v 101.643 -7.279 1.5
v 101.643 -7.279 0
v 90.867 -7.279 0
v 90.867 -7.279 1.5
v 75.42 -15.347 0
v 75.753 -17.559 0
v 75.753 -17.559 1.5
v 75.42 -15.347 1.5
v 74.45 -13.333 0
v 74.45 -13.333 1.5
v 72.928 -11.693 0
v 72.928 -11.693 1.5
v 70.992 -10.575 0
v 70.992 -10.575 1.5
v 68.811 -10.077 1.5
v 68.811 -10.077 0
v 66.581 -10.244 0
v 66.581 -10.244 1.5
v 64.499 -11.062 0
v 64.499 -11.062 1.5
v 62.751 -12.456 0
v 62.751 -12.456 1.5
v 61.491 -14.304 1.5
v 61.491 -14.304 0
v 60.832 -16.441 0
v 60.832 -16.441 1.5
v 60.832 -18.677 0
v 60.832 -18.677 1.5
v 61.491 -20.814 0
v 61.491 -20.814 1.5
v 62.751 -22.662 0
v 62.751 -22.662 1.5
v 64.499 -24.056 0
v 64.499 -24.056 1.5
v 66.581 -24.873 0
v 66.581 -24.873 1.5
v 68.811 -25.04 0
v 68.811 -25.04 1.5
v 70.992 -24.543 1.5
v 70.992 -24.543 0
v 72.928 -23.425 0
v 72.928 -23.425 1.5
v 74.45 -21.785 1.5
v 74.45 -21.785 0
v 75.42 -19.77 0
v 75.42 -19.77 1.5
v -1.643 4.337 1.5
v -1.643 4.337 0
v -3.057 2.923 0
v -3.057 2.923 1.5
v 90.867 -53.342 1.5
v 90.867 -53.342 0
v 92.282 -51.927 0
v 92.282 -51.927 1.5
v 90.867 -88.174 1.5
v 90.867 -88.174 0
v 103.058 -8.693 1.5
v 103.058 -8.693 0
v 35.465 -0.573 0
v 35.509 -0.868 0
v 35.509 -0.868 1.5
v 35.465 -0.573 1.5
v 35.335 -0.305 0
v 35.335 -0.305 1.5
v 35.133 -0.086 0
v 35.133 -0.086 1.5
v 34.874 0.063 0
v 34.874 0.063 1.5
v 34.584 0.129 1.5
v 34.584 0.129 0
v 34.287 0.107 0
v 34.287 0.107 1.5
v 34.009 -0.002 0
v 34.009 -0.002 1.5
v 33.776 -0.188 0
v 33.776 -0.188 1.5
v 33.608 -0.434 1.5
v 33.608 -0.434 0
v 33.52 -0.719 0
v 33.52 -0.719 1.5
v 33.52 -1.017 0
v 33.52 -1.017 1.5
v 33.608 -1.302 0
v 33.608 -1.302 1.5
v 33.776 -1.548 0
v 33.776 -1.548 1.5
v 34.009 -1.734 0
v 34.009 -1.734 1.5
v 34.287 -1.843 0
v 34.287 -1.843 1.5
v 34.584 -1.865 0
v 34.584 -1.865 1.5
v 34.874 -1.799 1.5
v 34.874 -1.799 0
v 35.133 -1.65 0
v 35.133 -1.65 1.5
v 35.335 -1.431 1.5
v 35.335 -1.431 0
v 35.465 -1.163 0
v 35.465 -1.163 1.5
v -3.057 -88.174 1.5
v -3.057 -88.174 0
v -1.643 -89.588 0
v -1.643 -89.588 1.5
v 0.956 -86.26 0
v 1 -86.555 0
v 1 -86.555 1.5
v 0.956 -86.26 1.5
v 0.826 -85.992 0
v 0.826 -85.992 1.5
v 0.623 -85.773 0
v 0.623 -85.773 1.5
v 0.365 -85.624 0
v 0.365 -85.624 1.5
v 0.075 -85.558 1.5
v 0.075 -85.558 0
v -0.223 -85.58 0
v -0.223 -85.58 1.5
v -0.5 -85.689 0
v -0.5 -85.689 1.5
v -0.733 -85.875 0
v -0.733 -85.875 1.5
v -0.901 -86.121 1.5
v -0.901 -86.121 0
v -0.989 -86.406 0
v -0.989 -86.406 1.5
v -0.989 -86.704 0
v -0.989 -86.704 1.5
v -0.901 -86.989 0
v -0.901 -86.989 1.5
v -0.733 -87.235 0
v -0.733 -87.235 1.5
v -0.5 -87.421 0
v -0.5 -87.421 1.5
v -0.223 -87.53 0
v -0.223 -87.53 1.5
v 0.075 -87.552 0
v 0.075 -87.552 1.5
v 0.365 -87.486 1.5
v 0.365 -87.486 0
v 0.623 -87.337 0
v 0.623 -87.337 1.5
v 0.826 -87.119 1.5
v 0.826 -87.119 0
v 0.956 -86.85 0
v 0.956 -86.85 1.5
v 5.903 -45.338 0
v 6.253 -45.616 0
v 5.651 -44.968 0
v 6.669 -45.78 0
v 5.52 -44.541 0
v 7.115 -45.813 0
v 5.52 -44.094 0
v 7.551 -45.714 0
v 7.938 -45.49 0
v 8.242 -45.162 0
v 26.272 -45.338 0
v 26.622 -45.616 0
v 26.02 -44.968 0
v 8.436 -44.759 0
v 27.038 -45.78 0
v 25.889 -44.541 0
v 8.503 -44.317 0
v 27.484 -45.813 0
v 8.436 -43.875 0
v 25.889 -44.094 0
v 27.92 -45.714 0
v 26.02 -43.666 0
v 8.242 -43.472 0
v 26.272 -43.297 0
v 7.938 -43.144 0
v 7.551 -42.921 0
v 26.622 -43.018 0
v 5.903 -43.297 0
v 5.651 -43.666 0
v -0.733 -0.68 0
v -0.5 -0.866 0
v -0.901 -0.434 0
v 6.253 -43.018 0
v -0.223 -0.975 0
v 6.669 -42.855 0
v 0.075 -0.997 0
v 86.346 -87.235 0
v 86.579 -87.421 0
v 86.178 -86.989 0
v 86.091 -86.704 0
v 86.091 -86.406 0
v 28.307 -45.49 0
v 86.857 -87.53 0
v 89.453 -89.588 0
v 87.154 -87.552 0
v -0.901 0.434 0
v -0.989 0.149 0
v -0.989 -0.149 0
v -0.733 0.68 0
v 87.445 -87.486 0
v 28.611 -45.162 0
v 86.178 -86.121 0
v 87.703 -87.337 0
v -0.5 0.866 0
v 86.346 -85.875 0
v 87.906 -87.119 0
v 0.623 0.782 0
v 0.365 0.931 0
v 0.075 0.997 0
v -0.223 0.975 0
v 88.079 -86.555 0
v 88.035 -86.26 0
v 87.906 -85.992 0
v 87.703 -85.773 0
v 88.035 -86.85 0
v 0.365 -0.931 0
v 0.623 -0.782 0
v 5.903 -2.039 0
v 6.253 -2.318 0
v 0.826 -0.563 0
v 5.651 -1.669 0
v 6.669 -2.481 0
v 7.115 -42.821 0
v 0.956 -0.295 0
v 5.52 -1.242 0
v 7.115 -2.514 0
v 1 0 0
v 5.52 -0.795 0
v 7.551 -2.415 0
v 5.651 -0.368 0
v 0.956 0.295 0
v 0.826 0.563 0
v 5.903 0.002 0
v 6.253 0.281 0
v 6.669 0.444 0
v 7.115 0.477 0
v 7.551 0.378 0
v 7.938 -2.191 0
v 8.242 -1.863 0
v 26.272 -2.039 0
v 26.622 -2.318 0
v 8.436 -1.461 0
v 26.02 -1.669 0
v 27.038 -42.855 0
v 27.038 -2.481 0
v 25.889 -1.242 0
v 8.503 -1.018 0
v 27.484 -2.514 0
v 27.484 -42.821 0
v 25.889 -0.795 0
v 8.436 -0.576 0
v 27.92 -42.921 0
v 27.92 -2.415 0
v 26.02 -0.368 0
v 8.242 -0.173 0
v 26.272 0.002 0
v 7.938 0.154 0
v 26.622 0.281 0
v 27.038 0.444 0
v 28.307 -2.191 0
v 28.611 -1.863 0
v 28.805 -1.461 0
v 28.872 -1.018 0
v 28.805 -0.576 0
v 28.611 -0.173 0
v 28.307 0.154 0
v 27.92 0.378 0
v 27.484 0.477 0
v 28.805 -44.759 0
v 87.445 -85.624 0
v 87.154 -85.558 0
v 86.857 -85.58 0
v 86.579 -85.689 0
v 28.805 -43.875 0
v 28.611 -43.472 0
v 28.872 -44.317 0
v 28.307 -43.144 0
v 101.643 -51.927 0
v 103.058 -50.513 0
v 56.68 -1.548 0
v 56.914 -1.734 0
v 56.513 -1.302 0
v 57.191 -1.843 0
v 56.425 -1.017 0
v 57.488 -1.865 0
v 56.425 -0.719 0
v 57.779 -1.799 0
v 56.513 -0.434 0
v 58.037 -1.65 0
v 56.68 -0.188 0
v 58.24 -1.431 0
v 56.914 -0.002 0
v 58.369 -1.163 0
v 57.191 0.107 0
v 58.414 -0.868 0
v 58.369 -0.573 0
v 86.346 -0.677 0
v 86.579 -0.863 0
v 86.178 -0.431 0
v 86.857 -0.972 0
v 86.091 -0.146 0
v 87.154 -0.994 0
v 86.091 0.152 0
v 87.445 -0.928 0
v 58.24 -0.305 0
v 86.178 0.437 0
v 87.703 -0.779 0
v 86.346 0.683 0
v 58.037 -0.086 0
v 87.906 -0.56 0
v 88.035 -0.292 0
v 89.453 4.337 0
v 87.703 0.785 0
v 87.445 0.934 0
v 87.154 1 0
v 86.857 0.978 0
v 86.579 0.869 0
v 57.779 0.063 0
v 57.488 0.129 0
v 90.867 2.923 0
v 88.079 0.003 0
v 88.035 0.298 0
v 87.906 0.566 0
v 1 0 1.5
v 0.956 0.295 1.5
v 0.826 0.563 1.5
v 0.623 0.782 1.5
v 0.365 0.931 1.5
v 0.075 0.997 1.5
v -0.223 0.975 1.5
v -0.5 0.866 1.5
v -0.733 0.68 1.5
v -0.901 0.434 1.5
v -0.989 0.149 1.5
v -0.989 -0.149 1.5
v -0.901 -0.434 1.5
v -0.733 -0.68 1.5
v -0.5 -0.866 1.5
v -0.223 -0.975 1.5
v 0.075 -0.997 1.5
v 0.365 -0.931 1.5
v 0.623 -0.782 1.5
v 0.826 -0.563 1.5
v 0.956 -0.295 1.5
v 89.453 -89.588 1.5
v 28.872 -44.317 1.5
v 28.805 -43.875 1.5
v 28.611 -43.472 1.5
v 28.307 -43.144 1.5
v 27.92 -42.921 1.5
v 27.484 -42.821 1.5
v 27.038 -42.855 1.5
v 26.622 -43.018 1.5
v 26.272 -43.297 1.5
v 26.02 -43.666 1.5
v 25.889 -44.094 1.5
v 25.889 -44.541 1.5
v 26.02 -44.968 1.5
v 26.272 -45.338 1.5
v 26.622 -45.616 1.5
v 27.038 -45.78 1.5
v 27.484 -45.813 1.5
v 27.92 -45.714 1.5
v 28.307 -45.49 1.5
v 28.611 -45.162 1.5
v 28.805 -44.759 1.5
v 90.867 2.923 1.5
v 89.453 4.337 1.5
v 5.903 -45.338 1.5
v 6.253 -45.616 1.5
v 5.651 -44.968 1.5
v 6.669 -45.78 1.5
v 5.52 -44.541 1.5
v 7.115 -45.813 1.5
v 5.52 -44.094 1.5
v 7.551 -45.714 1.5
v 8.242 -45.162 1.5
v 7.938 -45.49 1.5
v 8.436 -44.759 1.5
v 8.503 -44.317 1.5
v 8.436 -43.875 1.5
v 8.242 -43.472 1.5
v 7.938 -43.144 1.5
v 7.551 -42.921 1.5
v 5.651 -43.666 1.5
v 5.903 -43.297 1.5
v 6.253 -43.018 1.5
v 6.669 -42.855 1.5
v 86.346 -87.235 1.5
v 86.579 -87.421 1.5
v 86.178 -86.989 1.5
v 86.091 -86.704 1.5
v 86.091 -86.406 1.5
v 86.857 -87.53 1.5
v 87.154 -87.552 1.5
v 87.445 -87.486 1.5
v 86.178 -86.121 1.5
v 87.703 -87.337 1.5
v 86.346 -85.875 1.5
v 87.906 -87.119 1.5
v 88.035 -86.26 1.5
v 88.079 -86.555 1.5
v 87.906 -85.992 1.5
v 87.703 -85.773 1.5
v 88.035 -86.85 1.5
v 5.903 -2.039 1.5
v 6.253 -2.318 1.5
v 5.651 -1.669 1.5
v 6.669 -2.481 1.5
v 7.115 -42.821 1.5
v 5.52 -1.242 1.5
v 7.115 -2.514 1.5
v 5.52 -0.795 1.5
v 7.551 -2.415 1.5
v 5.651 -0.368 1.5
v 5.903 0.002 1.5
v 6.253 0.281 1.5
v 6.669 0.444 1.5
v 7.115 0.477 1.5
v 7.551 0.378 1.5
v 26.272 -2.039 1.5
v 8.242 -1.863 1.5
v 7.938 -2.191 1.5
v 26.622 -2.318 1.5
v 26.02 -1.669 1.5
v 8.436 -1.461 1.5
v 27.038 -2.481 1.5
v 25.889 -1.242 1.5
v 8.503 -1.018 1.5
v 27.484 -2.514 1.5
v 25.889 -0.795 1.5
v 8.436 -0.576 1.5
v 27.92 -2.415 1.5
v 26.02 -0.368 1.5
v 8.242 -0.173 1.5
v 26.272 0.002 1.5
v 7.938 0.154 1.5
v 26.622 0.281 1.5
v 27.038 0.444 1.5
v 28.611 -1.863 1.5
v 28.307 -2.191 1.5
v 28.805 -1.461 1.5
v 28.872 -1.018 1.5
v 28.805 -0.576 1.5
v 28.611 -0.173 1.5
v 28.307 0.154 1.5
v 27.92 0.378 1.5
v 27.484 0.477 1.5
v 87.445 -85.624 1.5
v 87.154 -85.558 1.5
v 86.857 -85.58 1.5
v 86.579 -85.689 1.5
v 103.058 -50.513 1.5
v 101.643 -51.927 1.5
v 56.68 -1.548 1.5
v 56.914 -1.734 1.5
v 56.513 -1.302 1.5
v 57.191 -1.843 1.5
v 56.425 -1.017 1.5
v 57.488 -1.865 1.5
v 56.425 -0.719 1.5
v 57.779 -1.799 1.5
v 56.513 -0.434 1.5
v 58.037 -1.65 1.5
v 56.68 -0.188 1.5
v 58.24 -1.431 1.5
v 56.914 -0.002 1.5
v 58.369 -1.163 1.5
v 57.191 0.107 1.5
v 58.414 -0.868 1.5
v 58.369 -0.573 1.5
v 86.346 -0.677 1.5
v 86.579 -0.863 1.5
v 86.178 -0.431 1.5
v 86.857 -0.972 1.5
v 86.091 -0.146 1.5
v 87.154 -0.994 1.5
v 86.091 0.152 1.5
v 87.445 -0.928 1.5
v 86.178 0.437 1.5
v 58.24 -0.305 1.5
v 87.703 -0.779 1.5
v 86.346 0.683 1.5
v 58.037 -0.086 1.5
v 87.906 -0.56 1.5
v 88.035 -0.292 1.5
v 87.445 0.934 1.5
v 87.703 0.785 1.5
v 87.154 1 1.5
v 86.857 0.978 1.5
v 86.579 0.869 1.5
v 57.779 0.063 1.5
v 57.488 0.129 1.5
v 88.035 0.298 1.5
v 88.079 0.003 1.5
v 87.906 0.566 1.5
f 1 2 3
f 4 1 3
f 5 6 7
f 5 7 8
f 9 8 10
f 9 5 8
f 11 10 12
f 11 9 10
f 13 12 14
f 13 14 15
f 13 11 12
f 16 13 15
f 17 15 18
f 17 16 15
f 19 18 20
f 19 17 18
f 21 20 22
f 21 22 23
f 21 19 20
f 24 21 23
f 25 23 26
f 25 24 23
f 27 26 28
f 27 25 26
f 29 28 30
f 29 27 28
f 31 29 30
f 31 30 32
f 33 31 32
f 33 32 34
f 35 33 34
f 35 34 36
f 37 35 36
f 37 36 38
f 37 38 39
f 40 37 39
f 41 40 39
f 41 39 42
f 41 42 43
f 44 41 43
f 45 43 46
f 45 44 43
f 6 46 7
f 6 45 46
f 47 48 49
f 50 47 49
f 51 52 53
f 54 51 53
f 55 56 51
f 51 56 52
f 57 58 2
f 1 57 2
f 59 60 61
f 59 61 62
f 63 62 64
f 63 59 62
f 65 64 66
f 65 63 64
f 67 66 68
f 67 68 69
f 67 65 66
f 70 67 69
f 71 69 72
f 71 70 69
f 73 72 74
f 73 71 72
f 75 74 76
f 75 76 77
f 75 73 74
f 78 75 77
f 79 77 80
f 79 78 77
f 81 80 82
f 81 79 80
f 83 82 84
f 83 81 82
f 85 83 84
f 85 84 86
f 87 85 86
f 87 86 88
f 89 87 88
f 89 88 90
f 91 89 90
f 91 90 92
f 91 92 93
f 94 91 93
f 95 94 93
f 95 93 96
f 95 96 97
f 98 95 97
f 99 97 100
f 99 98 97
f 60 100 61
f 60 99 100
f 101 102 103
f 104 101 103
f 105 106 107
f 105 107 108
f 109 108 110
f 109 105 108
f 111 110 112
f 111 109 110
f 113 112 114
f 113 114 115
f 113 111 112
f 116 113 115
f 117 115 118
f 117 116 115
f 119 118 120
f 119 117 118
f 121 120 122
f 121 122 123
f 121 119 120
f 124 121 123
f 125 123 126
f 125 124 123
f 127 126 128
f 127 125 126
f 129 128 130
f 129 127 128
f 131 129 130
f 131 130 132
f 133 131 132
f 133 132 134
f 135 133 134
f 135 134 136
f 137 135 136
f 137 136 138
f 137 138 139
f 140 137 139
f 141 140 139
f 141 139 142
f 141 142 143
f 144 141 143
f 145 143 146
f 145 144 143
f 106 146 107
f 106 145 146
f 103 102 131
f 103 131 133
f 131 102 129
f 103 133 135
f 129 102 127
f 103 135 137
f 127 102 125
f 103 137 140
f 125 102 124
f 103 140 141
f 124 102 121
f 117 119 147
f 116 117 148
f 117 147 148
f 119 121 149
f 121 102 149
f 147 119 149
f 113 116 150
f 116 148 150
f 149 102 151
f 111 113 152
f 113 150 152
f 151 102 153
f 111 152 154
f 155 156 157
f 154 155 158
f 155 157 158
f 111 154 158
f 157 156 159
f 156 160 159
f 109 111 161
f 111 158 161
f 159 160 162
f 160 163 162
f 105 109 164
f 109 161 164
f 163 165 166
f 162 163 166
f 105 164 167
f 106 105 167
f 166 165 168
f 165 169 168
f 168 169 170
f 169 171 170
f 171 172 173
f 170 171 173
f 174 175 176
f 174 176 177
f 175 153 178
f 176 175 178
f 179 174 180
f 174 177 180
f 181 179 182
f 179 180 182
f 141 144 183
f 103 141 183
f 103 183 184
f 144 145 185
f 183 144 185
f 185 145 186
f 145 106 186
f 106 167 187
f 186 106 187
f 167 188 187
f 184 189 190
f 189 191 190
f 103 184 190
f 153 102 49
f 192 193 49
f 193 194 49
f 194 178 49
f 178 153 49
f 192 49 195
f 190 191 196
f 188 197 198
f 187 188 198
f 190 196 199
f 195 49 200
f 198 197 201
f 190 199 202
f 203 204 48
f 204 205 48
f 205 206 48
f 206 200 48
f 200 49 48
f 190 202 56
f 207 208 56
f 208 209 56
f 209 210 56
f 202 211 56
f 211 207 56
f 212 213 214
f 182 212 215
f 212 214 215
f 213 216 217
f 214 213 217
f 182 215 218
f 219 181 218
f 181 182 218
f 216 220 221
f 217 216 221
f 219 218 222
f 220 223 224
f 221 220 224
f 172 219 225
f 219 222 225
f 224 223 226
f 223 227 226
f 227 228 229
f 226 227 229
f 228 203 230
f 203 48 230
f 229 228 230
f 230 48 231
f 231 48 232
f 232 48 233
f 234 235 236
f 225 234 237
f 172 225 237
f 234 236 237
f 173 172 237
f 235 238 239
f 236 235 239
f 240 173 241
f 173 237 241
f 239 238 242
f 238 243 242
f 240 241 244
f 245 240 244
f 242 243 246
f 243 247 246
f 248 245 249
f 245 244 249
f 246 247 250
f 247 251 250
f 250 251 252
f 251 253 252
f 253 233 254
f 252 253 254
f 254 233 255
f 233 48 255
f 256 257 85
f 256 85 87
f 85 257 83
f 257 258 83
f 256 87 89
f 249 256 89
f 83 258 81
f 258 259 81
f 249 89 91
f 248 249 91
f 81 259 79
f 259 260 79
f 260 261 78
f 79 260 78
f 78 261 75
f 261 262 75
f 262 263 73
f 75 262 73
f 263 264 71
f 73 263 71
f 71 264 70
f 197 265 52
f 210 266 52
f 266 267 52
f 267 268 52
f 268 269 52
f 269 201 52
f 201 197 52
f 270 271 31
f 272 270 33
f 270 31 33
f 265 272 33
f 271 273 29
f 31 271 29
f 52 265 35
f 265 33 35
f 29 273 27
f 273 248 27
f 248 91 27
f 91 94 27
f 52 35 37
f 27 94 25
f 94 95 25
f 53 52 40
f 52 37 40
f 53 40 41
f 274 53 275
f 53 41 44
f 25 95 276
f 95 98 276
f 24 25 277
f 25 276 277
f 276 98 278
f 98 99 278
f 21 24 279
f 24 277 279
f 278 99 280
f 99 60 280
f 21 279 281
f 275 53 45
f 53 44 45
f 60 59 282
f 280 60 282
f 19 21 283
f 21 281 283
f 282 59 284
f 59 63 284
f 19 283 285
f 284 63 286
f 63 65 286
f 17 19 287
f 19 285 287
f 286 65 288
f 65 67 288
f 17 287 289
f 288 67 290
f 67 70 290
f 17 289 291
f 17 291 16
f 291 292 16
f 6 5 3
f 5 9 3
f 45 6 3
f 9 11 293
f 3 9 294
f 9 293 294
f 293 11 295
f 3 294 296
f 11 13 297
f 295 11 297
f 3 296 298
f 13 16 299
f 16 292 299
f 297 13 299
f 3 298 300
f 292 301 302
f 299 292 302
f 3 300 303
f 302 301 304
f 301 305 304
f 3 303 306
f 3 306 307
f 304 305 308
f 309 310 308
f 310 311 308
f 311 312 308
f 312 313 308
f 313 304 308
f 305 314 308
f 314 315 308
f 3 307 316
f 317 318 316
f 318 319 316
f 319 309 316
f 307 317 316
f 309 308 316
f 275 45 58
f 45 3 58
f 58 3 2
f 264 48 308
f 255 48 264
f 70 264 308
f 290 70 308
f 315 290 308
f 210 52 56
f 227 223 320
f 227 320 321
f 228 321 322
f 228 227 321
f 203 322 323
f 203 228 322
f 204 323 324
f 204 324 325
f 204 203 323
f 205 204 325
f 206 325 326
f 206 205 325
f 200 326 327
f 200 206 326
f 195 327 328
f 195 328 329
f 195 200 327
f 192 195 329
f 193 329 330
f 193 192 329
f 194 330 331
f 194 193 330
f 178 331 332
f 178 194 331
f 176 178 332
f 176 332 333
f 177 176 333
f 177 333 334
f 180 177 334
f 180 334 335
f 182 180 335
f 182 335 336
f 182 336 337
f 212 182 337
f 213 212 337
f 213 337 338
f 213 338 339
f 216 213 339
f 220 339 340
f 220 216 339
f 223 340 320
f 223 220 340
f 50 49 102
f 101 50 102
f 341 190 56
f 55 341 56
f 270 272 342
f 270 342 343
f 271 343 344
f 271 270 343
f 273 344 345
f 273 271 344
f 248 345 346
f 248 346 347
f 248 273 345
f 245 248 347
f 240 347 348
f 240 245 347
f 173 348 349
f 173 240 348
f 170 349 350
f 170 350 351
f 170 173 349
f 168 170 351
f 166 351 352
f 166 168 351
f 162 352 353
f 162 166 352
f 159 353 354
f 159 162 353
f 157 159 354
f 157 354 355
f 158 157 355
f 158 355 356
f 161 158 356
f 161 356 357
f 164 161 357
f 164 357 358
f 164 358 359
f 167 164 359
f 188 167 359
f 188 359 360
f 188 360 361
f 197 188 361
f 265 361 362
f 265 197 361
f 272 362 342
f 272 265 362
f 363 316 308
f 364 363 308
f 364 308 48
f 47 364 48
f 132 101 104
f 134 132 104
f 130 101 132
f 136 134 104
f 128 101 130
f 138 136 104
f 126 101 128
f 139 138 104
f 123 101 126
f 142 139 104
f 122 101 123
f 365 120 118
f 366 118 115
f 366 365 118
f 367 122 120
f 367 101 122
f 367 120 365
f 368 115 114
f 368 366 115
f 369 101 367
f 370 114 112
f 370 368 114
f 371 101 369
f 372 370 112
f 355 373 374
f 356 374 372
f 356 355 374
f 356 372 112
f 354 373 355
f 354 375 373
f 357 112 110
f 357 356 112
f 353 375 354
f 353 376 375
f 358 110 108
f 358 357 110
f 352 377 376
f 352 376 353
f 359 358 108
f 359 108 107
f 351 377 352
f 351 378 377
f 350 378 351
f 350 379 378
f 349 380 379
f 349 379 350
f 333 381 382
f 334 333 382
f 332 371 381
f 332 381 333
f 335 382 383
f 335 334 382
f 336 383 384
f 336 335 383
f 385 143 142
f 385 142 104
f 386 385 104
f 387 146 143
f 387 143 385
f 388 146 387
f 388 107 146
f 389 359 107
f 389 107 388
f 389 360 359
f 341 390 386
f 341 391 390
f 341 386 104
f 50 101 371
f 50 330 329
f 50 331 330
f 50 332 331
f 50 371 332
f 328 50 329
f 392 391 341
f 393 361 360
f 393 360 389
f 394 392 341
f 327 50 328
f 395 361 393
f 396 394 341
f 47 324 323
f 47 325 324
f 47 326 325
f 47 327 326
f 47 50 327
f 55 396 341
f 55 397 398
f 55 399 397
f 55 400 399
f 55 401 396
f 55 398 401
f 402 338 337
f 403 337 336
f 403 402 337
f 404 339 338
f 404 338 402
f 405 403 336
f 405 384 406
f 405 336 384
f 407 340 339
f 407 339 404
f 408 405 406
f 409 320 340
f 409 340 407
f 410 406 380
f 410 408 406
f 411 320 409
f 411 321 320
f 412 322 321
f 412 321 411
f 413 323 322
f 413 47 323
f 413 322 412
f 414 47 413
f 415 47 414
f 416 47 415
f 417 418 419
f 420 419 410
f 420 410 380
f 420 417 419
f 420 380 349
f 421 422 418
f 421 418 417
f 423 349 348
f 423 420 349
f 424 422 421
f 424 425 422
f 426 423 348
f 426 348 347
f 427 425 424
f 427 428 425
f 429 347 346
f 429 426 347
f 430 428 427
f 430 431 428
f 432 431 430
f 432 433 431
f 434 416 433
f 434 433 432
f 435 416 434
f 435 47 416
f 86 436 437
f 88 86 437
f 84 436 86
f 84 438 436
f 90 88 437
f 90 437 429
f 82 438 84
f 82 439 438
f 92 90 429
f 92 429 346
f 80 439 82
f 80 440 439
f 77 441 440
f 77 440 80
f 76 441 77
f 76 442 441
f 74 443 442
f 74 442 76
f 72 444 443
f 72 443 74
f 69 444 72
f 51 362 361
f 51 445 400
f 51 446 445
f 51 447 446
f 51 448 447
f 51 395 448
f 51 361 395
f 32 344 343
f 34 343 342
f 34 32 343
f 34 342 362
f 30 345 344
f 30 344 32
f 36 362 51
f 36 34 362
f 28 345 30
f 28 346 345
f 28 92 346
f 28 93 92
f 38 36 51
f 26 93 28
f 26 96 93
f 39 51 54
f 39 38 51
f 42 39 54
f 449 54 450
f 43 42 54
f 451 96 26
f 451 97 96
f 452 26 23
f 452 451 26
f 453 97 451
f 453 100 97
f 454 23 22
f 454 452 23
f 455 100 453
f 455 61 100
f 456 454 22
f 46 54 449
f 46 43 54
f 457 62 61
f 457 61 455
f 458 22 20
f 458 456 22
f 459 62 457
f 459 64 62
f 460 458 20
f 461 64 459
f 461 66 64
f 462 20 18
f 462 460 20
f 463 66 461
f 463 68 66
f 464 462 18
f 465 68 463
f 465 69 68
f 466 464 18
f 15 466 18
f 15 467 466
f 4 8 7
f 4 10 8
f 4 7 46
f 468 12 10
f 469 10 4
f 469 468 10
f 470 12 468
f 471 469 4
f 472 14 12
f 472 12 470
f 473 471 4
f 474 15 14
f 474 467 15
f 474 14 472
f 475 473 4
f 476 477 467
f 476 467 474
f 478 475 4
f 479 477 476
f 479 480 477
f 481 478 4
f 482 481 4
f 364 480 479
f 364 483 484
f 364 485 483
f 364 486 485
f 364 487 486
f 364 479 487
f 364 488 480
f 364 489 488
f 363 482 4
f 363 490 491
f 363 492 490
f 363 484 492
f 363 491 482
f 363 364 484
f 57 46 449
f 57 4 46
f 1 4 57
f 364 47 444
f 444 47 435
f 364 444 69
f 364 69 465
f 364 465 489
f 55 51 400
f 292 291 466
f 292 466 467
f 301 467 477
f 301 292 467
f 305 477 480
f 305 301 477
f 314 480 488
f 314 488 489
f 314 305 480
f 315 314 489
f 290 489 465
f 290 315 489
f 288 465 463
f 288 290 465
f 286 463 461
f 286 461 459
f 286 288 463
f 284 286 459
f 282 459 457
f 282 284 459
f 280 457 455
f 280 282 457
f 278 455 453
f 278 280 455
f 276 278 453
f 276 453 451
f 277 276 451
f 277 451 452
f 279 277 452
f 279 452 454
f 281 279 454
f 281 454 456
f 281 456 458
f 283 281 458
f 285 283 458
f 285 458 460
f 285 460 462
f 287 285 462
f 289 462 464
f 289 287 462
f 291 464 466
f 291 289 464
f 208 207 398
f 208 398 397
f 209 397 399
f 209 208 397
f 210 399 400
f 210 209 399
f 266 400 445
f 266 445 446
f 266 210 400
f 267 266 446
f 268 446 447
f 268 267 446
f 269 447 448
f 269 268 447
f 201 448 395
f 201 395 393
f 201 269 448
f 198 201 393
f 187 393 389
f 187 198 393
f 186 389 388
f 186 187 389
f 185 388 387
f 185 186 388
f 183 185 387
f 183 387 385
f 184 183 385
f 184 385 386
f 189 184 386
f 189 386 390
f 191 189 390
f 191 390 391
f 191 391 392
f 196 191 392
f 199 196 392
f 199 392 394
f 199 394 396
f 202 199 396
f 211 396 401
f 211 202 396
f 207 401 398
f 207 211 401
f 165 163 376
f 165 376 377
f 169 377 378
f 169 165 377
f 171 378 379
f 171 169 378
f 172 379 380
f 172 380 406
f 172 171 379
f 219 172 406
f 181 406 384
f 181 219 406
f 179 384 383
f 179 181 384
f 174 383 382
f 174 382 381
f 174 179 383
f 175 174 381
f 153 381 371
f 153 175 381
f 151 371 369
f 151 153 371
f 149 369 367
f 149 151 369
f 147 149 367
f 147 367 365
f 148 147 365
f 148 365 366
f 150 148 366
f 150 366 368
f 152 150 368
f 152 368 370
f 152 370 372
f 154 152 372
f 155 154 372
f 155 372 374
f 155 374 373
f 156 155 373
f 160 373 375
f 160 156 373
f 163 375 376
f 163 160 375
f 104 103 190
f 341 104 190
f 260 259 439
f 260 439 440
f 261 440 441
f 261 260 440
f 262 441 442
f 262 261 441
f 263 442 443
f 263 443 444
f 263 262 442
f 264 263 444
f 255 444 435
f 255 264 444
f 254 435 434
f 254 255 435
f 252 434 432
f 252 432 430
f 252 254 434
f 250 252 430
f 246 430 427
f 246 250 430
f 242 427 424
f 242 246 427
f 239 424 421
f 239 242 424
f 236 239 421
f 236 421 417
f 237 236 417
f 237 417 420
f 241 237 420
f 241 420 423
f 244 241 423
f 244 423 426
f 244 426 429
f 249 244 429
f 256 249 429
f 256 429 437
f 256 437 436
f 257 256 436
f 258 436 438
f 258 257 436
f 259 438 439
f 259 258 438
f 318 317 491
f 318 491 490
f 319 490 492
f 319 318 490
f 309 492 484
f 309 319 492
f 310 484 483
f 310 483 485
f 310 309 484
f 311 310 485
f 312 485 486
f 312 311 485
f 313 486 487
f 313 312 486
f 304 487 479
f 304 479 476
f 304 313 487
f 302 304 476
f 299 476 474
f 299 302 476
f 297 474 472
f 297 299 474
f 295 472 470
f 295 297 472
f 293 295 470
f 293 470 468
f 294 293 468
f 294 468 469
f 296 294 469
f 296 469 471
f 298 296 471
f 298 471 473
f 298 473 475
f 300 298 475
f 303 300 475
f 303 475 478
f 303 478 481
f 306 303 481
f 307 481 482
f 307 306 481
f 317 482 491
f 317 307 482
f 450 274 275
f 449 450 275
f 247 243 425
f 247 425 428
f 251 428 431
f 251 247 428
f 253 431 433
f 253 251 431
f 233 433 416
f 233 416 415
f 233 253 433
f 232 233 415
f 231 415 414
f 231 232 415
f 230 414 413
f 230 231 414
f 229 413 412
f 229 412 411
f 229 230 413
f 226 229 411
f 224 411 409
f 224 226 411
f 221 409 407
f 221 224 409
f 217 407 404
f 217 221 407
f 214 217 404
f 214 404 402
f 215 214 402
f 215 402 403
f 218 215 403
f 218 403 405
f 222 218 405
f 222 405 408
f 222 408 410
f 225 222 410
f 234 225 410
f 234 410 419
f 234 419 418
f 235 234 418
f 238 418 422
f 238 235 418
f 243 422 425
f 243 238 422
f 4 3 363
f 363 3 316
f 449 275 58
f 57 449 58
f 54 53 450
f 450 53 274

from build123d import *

# Parameters (mm, degrees)
SKETCH1_R           = 1.5
SKETCH1_R_2         = 1
SKETCH1_R_3         = 7.502494881
BOSS_EXTRUDE2_DEPTH = 1.5


with BuildPart() as part:
    # Sketch1 → Boss-Extrude2 (new body)
    with BuildSketch(Plane.XY):
        Polygon((89.453108516, 4.337043032), (-1.643229796, 4.337043032), (-3.057443358, 2.92282947), (-3.057443358, -88.173508842), (-1.643229796, -89.587722405), (89.453108516, -89.587722405), (90.867322078, -88.173508842), (90.867322078, -53.341657496), (92.281535641, -51.927443934), (101.643338186, -51.927443934), (103.057551748, -50.513230371), (103.057551748, -8.692923399), (101.643338186, -7.278709837), (90.867322078, -7.278709837), (90.867322078, 2.92282947), align=None)
        with Locations((7.002900718, -1.018478259)):
            Circle(SKETCH1_R, mode=Mode.SUBTRACT)
        with Locations((27.371818874, -1.018478259)):
            Circle(SKETCH1_R, mode=Mode.SUBTRACT)
        with Locations((34.50904124, -0.868109843)):
            Circle(SKETCH1_R_2, mode=Mode.SUBTRACT)
        with Locations((57.413525643, -0.868109843)):
            Circle(SKETCH1_R_2, mode=Mode.SUBTRACT)
        with Locations((87.07937983, 0.003106997)):
            Circle(SKETCH1_R_2, mode=Mode.SUBTRACT)
        with Locations((68.250695172, -17.55885203)):
            Circle(SKETCH1_R_3, mode=Mode.SUBTRACT)
        with Locations((7.002900718, -44.317247133)):
            Circle(SKETCH1_R, mode=Mode.SUBTRACT)
        with Locations((27.371818874, -44.317247133)):
            Circle(SKETCH1_R, mode=Mode.SUBTRACT)
        with Locations((0, -86.555222321)):
            Circle(SKETCH1_R_2, mode=Mode.SUBTRACT)
        with Locations((87.07937983, -86.555222321)):
            Circle(SKETCH1_R_2, mode=Mode.SUBTRACT)
        Circle(SKETCH1_R_2, mode=Mode.SUBTRACT)
    extrude(amount=BOSS_EXTRUDE2_DEPTH)


solid = part.part
